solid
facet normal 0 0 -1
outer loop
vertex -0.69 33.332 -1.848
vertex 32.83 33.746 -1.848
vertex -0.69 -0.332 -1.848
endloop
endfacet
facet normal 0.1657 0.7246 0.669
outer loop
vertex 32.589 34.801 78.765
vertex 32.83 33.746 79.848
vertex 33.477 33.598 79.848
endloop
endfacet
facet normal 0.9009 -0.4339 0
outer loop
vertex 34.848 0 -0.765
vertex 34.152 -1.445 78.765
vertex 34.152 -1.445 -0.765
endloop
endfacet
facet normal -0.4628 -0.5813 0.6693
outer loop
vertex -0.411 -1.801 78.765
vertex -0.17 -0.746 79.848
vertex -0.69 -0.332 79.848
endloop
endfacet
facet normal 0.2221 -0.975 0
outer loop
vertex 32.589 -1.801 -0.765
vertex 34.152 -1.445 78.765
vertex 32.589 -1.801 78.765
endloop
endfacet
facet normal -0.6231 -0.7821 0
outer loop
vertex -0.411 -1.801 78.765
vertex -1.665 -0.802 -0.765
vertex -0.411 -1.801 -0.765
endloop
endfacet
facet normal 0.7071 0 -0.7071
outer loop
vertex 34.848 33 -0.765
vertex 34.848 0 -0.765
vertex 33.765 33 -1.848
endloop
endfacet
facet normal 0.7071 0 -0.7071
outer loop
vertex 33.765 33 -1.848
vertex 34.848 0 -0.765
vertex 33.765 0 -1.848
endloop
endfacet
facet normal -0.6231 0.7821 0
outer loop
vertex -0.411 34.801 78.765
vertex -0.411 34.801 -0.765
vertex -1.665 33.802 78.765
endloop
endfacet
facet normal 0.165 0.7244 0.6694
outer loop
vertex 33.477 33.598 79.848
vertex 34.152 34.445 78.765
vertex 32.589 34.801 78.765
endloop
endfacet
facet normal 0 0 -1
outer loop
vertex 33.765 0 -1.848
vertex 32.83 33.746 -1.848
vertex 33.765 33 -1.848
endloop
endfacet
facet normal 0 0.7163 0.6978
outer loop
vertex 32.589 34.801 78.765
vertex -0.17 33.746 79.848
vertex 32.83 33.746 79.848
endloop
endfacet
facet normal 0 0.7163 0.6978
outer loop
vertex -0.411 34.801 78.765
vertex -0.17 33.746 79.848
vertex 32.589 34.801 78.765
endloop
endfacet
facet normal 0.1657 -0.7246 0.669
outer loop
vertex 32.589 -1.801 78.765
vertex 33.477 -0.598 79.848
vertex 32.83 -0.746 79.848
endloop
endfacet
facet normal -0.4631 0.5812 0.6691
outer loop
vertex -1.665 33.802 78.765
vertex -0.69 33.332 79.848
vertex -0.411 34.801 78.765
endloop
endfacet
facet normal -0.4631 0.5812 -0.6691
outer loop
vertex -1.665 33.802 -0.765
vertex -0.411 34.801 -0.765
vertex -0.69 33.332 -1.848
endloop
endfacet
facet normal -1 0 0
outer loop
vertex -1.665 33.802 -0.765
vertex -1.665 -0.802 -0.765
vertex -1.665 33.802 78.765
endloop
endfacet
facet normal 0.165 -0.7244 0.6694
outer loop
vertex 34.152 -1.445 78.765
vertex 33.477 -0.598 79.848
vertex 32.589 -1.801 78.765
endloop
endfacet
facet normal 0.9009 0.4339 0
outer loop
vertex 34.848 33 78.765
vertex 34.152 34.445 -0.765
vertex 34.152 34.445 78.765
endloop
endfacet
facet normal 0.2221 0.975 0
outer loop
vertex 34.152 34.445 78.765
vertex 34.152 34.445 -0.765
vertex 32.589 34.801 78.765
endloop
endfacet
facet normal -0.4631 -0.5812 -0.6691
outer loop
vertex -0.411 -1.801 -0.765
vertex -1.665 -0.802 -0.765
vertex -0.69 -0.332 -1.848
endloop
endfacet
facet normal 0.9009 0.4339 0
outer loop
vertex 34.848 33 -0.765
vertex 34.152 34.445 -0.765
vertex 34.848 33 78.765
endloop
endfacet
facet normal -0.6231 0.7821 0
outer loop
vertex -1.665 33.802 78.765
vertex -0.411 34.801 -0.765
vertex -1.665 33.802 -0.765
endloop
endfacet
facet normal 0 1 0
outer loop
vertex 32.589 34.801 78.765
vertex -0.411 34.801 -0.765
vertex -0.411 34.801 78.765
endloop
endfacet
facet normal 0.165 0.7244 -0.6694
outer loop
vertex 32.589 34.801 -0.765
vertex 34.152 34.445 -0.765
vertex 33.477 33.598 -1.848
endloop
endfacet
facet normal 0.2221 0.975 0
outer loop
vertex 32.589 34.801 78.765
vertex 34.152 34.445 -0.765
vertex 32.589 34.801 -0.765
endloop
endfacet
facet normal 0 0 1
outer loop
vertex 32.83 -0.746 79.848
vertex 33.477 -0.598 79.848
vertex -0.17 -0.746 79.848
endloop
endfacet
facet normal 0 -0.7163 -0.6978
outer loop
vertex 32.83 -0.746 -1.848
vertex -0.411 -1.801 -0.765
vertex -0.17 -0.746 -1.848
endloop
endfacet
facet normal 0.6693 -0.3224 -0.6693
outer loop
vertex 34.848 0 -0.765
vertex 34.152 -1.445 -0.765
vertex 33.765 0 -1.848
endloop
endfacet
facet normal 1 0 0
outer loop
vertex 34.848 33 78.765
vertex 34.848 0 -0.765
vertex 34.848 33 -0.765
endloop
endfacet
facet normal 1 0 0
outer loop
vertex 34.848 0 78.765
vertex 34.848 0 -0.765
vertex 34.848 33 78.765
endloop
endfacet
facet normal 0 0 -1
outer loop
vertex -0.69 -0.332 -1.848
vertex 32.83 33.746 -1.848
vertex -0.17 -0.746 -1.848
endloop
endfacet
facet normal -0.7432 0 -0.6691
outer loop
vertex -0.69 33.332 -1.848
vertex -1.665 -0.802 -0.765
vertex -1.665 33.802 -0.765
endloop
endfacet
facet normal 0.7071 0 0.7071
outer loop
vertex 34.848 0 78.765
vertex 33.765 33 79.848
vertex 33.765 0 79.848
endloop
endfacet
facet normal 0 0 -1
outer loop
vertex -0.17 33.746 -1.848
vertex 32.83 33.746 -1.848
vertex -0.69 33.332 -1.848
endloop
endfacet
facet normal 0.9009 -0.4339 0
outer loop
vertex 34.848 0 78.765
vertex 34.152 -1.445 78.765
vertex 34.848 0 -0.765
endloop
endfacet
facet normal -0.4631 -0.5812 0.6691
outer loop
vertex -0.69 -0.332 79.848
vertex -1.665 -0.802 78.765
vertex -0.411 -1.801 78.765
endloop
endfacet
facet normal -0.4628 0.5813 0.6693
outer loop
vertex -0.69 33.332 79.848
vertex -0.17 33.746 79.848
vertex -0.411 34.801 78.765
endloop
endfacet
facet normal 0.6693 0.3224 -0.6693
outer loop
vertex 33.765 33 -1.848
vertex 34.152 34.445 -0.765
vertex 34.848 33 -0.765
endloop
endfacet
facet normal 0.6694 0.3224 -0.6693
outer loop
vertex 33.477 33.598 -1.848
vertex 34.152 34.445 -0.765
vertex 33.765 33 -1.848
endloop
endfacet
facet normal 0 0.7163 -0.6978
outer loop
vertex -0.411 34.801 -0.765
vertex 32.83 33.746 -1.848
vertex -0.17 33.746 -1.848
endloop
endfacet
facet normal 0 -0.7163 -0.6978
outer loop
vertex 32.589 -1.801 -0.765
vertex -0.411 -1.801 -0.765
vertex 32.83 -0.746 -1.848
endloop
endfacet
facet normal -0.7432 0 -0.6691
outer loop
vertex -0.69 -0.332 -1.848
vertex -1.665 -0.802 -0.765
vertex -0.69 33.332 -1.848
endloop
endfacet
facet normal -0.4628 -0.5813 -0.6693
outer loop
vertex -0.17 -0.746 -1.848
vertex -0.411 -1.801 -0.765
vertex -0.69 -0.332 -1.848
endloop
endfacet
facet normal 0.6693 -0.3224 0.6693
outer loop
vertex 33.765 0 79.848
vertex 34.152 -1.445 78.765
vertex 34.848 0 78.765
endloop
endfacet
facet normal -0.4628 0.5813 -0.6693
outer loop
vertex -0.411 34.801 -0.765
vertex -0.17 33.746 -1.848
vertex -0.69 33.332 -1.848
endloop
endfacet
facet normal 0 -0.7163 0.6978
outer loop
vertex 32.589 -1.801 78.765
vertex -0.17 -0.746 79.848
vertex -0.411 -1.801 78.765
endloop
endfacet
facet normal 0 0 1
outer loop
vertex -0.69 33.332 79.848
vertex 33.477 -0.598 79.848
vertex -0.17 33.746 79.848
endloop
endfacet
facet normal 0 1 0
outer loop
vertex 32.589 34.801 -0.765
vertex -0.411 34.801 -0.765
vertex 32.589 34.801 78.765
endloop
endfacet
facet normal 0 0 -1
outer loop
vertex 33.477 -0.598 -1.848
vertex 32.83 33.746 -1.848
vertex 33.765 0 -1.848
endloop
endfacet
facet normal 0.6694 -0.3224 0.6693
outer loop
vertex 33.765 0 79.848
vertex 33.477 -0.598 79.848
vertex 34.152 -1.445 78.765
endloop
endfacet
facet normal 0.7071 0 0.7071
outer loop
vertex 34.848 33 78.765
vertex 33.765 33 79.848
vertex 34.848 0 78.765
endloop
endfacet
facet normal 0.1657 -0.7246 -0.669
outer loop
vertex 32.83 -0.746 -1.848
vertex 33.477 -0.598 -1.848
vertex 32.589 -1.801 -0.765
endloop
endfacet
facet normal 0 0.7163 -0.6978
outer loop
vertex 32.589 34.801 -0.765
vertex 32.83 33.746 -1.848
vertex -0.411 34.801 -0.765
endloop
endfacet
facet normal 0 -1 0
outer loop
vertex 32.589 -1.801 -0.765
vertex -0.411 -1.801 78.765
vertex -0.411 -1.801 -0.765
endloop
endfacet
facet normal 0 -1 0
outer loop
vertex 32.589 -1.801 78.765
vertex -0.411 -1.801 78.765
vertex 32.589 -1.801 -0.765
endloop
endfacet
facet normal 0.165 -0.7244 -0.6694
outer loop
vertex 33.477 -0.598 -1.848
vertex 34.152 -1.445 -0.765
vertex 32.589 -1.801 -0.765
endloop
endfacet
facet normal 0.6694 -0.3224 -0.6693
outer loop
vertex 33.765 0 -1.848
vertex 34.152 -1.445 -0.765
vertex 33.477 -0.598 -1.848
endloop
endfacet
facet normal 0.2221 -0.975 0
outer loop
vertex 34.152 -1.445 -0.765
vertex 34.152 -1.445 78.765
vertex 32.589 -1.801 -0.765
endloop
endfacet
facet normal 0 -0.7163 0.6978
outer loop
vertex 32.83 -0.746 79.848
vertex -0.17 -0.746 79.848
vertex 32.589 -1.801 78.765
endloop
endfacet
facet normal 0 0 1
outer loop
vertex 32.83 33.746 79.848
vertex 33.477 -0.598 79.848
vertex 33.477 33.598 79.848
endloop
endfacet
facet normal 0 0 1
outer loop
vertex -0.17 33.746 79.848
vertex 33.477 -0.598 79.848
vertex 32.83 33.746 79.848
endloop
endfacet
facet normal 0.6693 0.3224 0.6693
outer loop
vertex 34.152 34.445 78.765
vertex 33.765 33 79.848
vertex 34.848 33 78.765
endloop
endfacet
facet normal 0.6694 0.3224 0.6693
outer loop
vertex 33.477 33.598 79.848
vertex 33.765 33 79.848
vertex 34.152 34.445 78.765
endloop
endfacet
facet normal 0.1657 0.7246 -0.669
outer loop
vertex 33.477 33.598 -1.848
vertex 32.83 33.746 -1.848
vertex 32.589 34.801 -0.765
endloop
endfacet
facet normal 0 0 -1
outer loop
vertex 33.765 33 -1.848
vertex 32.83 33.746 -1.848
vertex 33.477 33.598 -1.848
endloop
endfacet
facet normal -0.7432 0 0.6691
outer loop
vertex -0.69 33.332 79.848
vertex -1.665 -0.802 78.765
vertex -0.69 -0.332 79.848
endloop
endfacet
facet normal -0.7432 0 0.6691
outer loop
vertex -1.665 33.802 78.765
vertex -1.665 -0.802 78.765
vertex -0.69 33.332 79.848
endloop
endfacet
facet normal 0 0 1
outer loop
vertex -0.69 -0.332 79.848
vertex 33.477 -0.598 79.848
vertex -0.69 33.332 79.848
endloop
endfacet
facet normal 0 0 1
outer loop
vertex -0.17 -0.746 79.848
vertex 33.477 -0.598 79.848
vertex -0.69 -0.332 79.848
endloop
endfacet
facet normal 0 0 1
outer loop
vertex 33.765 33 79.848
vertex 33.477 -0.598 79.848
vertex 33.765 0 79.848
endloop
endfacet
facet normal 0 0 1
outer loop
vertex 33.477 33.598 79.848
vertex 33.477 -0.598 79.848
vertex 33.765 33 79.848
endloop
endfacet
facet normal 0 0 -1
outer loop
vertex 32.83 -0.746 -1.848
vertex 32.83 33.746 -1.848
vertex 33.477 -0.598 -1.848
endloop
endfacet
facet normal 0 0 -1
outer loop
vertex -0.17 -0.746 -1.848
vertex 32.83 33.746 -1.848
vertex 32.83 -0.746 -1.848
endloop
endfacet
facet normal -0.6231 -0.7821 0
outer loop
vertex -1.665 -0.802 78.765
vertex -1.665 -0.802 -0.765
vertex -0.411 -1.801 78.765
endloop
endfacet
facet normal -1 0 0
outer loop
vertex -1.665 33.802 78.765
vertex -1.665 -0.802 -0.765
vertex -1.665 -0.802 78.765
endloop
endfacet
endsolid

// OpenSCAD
// Parameters
height = 80;       // 80mm = 8cm height to reach GPU
width = 35;        // Width of the block
depth = 35;        // Depth of the block
rounding = 2;      // Optional: corner rounding radius

// Block with slightly rounded edges
module gpu_support() {
    minkowski() {
        cube([width - rounding, depth - rounding, height - rounding]);
        sphere(r=rounding);
    }
}

gpu_support();
